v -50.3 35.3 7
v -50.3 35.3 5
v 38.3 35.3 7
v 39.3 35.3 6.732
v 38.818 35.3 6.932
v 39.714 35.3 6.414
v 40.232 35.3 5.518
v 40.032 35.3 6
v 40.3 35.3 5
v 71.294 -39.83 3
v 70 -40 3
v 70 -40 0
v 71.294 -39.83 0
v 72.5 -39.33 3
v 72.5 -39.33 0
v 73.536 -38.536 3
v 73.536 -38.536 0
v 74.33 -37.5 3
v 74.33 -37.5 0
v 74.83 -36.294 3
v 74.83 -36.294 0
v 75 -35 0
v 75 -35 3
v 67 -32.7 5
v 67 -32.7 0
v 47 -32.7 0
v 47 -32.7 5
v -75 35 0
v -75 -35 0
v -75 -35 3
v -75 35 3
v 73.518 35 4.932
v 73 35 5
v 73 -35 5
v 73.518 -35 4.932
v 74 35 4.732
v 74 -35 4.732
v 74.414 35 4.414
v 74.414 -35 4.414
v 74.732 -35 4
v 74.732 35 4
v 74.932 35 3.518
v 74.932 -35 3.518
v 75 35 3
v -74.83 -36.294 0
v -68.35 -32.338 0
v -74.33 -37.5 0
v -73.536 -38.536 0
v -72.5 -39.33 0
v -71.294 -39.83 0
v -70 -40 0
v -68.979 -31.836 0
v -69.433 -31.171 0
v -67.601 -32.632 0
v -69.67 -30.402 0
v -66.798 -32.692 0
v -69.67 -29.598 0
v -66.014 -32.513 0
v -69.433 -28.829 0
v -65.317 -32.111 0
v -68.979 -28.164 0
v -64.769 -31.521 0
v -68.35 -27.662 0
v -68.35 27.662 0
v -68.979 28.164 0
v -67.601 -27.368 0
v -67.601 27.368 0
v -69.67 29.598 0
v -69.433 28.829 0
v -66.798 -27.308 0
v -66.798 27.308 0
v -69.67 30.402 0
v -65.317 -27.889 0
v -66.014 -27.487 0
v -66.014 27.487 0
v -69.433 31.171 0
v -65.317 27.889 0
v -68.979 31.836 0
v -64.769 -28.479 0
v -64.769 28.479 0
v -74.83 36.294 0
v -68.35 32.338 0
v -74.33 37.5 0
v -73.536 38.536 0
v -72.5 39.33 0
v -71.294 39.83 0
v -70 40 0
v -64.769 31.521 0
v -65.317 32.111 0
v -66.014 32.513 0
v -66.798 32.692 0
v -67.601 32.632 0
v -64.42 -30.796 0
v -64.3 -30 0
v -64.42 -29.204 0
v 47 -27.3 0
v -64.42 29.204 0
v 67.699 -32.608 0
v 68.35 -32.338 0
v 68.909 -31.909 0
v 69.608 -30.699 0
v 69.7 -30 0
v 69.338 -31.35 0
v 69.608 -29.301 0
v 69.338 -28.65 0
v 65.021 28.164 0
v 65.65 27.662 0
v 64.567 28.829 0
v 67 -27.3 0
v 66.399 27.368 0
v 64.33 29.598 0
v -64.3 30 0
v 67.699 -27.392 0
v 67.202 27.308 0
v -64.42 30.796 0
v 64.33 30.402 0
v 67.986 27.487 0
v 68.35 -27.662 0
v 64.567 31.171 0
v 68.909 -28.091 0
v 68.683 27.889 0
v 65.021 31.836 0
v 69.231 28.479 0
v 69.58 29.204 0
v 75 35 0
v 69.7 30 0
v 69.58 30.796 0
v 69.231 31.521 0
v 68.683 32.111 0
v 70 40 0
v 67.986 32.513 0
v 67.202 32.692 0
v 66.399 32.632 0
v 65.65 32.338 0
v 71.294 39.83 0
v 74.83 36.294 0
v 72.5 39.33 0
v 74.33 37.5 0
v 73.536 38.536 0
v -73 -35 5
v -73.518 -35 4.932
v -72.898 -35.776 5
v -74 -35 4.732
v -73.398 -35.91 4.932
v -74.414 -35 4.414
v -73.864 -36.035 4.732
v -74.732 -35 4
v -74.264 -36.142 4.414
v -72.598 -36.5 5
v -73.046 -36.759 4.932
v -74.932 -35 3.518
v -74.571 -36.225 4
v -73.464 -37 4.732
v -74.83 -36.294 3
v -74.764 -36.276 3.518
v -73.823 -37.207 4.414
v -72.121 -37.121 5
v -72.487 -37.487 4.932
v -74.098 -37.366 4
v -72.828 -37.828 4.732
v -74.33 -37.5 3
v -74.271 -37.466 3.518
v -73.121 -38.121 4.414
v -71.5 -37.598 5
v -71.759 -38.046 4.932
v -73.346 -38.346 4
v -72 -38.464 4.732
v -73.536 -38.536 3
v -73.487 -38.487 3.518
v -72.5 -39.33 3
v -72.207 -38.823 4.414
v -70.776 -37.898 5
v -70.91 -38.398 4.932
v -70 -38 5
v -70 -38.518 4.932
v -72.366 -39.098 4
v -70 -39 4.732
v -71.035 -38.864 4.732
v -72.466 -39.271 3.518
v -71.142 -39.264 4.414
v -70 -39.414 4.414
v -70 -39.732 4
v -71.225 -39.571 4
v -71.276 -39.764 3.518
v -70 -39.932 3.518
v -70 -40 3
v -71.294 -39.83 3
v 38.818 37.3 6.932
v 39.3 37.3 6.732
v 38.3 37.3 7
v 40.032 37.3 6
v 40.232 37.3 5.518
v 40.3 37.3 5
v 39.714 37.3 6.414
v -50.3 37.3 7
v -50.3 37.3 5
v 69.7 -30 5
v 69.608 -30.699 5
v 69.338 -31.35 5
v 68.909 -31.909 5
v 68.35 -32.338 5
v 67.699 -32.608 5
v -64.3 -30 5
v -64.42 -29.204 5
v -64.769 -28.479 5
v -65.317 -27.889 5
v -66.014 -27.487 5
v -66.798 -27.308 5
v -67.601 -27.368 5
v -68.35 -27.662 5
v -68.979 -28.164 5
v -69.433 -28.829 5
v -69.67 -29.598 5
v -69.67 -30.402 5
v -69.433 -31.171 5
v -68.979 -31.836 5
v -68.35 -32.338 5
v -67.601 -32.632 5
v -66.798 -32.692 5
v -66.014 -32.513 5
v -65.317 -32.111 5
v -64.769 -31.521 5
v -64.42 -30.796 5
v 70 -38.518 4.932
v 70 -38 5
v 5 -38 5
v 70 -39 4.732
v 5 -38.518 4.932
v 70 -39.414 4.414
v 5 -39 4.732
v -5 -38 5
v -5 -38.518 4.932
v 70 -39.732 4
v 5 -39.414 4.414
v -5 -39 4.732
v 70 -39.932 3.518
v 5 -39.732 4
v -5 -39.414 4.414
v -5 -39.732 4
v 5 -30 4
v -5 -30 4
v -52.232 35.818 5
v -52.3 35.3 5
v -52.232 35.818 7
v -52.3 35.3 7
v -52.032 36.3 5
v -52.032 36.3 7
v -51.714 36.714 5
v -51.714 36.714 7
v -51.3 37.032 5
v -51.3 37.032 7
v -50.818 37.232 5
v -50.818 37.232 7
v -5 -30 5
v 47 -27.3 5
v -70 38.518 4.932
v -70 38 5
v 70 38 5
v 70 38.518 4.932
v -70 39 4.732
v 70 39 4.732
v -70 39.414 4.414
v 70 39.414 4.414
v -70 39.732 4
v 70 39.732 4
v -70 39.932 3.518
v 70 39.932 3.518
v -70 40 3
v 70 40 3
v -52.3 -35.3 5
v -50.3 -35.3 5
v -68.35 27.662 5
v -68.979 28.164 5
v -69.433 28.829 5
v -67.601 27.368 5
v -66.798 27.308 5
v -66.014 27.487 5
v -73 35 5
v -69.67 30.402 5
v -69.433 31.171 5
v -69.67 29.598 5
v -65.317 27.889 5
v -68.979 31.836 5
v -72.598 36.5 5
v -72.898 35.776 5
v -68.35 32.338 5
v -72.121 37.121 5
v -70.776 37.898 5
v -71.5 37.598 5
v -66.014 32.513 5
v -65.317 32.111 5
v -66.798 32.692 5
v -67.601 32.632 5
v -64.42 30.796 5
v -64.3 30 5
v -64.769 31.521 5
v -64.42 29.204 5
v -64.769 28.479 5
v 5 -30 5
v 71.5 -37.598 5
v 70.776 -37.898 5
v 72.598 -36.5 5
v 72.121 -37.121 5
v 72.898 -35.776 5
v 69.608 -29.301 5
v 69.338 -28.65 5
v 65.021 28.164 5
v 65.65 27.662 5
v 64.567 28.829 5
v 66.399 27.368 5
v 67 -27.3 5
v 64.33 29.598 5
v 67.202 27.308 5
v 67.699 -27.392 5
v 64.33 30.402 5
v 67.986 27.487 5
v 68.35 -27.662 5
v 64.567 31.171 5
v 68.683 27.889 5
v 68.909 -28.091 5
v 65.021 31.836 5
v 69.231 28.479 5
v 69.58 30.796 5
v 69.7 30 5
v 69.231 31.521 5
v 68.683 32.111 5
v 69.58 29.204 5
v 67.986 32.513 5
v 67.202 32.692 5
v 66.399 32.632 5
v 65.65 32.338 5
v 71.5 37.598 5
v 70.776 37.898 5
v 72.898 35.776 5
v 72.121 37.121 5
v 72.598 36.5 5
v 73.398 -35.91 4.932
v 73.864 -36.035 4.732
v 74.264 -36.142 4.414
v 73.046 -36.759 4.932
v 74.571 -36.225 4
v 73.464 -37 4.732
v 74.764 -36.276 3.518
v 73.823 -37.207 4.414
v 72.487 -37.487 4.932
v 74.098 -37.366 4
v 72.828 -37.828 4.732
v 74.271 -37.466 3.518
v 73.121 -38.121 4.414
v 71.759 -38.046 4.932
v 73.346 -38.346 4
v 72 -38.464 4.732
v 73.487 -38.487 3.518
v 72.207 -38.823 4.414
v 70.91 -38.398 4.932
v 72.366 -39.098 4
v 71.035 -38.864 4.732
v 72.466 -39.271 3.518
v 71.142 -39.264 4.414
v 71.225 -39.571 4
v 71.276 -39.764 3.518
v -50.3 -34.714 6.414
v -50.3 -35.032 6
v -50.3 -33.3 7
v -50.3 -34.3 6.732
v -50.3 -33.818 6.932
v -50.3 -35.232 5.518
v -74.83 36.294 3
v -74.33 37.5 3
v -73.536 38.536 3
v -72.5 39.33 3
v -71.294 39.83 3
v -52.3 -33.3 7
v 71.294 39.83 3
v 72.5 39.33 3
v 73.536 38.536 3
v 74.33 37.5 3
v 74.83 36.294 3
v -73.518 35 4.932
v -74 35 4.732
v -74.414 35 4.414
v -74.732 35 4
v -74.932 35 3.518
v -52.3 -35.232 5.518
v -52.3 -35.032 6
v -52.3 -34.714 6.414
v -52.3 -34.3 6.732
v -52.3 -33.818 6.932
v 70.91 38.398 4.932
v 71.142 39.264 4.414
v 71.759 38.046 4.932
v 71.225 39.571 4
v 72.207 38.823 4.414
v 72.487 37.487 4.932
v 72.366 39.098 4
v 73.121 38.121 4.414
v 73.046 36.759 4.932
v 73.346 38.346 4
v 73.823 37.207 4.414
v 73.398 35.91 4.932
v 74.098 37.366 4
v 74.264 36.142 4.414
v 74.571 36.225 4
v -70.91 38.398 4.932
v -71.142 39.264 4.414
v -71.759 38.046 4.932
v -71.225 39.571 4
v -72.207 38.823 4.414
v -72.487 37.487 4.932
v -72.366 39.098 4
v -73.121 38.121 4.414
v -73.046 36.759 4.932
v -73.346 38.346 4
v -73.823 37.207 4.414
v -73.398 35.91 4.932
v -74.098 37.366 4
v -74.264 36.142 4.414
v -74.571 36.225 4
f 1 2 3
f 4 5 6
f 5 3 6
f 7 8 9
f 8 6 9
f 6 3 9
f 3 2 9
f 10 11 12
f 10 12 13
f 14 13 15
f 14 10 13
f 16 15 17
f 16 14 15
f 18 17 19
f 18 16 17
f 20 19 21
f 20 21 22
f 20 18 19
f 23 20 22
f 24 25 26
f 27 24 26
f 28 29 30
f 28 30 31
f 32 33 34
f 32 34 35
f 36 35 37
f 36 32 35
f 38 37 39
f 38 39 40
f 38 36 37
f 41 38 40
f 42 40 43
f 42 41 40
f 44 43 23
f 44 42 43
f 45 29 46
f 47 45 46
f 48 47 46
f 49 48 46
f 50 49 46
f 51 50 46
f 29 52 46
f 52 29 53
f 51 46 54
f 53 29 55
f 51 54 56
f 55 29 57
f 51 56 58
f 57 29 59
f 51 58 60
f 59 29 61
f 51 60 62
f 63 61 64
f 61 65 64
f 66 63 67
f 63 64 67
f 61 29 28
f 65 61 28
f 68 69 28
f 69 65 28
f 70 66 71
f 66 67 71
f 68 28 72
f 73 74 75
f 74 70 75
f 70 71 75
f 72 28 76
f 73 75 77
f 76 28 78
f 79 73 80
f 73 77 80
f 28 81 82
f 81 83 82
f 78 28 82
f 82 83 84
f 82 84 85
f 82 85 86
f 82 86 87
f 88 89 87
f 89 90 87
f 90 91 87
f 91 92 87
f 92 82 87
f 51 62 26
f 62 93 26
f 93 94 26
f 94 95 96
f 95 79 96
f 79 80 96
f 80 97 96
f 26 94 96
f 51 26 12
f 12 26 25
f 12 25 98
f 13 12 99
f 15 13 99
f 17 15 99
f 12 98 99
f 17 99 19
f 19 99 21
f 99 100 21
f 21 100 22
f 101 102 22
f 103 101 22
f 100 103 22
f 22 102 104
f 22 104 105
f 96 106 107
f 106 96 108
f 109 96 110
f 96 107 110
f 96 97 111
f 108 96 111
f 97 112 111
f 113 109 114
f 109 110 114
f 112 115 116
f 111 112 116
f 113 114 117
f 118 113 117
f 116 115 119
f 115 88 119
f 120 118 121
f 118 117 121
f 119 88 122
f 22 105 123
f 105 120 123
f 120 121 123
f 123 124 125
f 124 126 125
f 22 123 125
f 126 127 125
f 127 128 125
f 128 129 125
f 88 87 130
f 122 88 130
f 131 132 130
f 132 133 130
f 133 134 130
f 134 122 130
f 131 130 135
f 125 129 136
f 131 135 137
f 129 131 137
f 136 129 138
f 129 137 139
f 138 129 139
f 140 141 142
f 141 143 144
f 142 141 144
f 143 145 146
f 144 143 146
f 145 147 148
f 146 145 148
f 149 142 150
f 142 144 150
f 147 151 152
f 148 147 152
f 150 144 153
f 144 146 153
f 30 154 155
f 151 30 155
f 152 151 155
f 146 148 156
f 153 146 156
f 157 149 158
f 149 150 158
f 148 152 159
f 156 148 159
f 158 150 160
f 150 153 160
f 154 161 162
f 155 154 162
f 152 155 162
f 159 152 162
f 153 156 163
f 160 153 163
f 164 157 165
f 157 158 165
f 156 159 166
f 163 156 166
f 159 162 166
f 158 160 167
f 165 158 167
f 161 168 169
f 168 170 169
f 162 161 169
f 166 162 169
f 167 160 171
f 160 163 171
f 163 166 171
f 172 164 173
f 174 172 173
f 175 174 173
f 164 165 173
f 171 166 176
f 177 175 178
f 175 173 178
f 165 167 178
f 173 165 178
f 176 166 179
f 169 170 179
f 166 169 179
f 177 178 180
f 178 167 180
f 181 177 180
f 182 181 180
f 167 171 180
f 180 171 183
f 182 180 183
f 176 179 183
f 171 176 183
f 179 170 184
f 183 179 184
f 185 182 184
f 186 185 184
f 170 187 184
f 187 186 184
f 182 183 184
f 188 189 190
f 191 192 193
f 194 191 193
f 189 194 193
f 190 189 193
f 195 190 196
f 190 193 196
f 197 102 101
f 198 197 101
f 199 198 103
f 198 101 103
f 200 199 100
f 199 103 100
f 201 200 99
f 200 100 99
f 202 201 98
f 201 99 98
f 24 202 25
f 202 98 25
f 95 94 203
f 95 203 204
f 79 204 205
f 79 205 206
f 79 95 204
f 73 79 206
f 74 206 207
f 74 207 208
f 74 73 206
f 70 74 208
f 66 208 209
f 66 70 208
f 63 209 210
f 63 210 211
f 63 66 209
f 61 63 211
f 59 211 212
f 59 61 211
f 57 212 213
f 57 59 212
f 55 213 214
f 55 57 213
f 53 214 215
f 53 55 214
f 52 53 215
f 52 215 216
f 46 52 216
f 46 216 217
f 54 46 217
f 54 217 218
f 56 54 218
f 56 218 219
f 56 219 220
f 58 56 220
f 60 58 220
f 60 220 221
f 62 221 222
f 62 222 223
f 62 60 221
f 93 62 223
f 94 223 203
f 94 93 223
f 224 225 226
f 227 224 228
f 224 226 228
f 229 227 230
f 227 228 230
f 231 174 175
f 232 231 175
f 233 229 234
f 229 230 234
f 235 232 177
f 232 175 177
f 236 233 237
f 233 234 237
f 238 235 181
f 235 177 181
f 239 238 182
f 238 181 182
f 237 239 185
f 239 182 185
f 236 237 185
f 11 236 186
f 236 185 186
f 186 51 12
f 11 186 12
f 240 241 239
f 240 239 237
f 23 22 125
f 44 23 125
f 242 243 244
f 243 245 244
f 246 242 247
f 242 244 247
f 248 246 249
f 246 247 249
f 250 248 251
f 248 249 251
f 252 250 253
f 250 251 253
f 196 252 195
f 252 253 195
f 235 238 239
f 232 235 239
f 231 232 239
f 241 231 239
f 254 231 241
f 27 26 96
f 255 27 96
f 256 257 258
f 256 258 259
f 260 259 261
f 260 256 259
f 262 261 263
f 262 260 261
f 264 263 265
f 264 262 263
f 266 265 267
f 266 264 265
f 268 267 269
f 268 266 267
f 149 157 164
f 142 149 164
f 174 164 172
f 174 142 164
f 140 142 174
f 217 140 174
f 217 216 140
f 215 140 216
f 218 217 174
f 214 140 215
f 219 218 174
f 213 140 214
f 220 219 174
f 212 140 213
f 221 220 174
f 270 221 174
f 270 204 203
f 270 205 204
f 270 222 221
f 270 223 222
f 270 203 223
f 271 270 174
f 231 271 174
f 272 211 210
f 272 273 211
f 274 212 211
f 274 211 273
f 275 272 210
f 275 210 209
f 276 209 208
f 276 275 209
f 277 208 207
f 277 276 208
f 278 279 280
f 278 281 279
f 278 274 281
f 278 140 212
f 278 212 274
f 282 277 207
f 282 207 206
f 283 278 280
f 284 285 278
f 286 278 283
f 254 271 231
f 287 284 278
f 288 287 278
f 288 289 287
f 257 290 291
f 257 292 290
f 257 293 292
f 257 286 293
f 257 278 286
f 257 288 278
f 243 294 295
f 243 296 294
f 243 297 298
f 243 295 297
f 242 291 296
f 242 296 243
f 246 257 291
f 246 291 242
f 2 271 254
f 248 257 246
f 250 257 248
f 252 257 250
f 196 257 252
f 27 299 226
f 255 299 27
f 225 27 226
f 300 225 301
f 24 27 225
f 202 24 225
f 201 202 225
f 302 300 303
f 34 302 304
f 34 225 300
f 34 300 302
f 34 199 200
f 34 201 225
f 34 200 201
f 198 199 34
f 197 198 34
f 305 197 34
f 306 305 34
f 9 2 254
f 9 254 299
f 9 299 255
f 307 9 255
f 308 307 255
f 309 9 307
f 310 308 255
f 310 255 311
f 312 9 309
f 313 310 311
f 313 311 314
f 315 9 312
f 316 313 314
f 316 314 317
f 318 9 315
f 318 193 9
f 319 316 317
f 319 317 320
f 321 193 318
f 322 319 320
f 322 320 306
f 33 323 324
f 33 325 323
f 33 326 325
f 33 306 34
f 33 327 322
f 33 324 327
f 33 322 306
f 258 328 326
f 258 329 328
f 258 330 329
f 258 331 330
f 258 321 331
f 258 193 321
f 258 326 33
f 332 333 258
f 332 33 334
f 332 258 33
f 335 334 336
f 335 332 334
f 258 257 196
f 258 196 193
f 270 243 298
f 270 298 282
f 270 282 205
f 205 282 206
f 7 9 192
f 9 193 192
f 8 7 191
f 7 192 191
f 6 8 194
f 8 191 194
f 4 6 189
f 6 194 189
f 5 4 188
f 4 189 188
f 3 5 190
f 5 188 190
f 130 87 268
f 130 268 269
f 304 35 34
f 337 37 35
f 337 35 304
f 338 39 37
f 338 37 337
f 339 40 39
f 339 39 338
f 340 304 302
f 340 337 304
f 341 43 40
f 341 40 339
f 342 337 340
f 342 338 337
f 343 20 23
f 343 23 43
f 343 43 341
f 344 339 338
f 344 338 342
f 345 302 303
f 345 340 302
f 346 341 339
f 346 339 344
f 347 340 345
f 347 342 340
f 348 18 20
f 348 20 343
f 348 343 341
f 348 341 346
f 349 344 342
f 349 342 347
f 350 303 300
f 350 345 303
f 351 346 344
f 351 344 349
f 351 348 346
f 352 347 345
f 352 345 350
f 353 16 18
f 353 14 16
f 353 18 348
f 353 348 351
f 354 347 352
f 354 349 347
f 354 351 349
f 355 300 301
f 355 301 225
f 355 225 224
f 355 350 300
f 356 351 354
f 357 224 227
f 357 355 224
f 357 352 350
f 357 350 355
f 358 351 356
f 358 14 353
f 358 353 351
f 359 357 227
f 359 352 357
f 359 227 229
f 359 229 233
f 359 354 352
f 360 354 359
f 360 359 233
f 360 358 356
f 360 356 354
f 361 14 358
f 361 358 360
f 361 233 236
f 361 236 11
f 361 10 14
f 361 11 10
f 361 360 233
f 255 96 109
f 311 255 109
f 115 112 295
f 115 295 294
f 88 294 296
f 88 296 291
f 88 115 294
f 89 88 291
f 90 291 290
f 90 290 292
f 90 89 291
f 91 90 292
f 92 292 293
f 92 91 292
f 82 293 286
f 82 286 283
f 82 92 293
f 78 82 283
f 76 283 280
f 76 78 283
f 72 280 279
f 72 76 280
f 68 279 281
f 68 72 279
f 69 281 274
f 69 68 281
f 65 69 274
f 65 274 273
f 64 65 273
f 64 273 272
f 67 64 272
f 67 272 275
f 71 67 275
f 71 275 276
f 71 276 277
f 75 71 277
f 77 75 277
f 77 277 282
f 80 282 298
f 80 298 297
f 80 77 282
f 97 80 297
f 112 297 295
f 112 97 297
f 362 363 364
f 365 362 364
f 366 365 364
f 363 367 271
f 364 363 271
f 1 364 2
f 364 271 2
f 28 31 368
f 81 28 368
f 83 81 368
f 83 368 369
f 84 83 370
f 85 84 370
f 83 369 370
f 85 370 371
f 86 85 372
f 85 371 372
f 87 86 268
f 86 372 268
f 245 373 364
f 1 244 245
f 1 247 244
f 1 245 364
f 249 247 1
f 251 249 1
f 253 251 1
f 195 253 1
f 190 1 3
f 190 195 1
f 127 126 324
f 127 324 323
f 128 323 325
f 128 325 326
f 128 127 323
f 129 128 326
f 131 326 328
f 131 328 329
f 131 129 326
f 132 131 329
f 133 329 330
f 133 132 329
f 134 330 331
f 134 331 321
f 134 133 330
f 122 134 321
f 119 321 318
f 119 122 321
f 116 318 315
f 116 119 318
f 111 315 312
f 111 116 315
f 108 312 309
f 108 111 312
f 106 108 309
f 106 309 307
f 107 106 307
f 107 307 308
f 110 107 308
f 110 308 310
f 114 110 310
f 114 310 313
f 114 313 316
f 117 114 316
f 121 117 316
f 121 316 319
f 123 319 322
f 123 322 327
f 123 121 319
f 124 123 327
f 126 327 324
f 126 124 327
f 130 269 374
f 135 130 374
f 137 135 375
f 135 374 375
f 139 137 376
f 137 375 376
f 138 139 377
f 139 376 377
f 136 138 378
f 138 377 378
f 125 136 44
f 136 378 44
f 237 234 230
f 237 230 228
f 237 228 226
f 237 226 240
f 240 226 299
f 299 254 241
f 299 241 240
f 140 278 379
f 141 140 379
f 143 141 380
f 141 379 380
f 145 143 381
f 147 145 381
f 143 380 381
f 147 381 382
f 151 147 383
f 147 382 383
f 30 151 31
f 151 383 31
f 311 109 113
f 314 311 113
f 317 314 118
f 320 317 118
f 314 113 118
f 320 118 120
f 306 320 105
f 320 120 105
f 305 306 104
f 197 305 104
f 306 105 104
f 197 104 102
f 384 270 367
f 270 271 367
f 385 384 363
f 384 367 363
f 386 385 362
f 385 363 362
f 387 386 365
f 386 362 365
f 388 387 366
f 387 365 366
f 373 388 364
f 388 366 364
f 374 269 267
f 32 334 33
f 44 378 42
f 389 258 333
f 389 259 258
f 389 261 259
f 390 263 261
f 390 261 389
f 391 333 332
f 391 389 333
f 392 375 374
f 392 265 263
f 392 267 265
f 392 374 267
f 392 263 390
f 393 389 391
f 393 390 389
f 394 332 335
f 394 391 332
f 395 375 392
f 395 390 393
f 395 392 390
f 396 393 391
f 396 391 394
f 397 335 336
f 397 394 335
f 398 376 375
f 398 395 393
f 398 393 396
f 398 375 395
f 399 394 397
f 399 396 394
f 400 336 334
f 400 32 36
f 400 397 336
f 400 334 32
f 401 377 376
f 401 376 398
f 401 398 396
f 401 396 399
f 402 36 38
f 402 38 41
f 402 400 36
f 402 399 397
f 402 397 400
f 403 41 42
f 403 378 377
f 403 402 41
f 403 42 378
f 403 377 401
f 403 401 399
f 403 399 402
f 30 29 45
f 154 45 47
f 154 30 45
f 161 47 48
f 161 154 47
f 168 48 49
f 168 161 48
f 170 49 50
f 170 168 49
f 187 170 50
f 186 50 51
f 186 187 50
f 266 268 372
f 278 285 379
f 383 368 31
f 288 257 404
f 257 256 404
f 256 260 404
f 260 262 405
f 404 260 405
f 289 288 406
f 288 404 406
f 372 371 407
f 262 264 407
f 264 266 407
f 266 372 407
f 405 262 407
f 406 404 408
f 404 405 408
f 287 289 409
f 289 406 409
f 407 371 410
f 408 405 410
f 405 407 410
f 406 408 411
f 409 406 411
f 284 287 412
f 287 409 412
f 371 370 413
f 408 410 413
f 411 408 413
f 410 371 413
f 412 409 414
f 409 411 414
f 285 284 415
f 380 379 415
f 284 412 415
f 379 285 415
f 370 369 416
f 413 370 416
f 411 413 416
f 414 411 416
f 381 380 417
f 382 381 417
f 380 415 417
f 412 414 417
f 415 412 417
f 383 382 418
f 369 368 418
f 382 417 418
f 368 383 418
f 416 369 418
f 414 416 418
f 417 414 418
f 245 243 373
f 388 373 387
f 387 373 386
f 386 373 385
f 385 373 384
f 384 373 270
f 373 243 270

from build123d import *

# Parameters (mm, degrees)
F0_W         = 150
F0_H         = 80
F0_R         = 2.7
F1_DEPTH     = 5
F3_DEPTH     = 2
F4_R         = 5
F5_R         = 1.99999
F6_R         = 2
F7_W         = 10
F7_H         = 10
F8_DEPTH     = 1
F9_T1_DEPTH  = 70
F9_T3_DEPTH  = 140
F9_T5_DEPTH  = 70
F9_T7_DEPTH  = 70
F9_T10_ANGLE = 90
F9_T12_ANGLE = 90
F9_T14_ANGLE = 90
F9_T16_ANGLE = 90


# Not quite as in the source:
# - a fillet or chamfer that OpenCascade refuses, or shapes differently, is made with other operations: its cross-section is extruded or revolved along the edge and cut away or added
# - a fillet or chamfer is up to 0.001 mm smaller than in the source, because OpenCascade refuses the exact size
# - a feature names something its author has since deleted; it is built from what else it names


with BuildPart() as f1:
    # F0 (on Top) → F1 (new body)
    with BuildSketch(Plane.XY):
        Rectangle(F0_W, F0_H)
        with Locations((-67, -30)):
            Circle(F0_R, mode=Mode.SUBTRACT)
        with BuildLine():
            ThreePointArc((67, -27.3), (68.9091883092, -28.0908116908), (69.7, -30))
            ThreePointArc((69.7, -30), (68.9091883092, -31.9091883092), (67, -32.7))
            Line((67, -32.7), (47, -32.7))
            Line((47, -32.7), (47, -27.3))
            Line((47, -27.3), (67, -27.3))
        make_face(mode=Mode.SUBTRACT)
        with Locations((-67, 30)):
            Circle(F0_R, mode=Mode.SUBTRACT)
        with Locations((67, 30)):
            Circle(F0_R, mode=Mode.SUBTRACT)
    extrude(amount=F1_DEPTH)

    # F2 (on face) → F3 (join)
    with BuildSketch(Plane.XY.offset(5)):
        Polygon((-50.3, -35.3), (-50.3, 35.3), (40.3, 35.3), (40.3, 37.3), (-52.3, 37.3), (-52.3, -35.3), align=None)
    extrude(amount=F3_DEPTH)

    # F4
    f4_edges = [f1.edges().sort_by_distance(p)[0] for p in [
        (75, -40, 2.5),
        (-75, -40, 2.5),
        (-75, 40, 2.5),
        (75, 40, 2.5),
    ]]
    fillet(f4_edges, radius=F4_R)

    # F5 (radius 2 in the source; OpenCascade refuses exactly that, so slightly less here)
    f5_edges = [f1.edges().sort_by_distance(p)[0] for p in [
        (-51.3, -35.3, 7),
        (40.3, 36.3, 7),
    ]]
    fillet(f5_edges, radius=F5_R)

    # F6
    f6_edges = [f1.edges().sort_by_distance(p)[0] for p in [
        (-52.3, 37.3, 6),
    ]]
    fillet(f6_edges, radius=F6_R)

    # F7 (on face) → F8 (cut)
    with BuildSketch(Plane.XY.offset(5)):
        with Locations((0, -35)):
            Rectangle(F7_W, F7_H)
    extrude(amount=-F8_DEPTH, mode=Mode.SUBTRACT)

    # F9: fillet of radius 2 on 7 edges, made by hand

    # F9_s2 → F9_t1 (cut)
    with BuildSketch(Plane.XZ.offset(-35)):
        with BuildLine():
            ThreePointArc((-73, 5), (-74.4142135624, 4.4142135624), (-75, 3))
            Line((-75, 3), (-75, 5))
            Line((-75, 5), (-73, 5))
        make_face()
        with BuildLine():
            ThreePointArc((73, 5), (74.4142135624, 4.4142135624), (75, 3))
            Line((75, 3), (75, 5))
            Line((75, 5), (73, 5))
        make_face()
    extrude(amount=F9_T1_DEPTH, mode=Mode.SUBTRACT)

    # F9_s4 → F9_t3 (cut)
    with BuildSketch(Plane.YZ.offset(-70)):
        with BuildLine():
            ThreePointArc((38, 5), (39.4142135624, 4.4142135624), (40, 3))
            Line((40, 3), (40, 5))
            Line((40, 5), (38, 5))
        make_face()
    extrude(amount=F9_T3_DEPTH, mode=Mode.SUBTRACT)

    # F9_s6 → F9_t5 (cut)
    with BuildSketch(Plane.YZ):
        with BuildLine():
            ThreePointArc((-38, 5), (-39.4142135624, 4.4142135624), (-40, 3))
            Line((-40, 3), (-40, 5))
            Line((-40, 5), (-38, 5))
        make_face()
    extrude(amount=F9_T5_DEPTH, mode=Mode.SUBTRACT)

    # F9_s8 → F9_t7 (cut)
    with BuildSketch(Plane.YZ.offset(-70)):
        with BuildLine():
            ThreePointArc((-38, 5), (-39.4142135624, 4.4142135624), (-40, 3))
            Line((-40, 3), (-40, 5))
            Line((-40, 5), (-38, 5))
        make_face()
    extrude(amount=F9_T7_DEPTH, mode=Mode.SUBTRACT)

    # F9_s9 → F9_t10 (revolve, cut)
    with BuildSketch(Plane.XZ.offset(35)):
        with BuildLine():
            ThreePointArc((-73, 5), (-74.4142135624, 4.4142135624), (-75, 3))
            Line((-75, 3), (-75, 5))
            Line((-75, 5), (-73, 5))
        make_face()
    revolve(axis=Axis((-70, -35, 5), (0, 0, 1)), revolution_arc=F9_T10_ANGLE, mode=Mode.SUBTRACT)

    # F9_s11 → F9_t12 (revolve, cut)
    with BuildSketch(Plane.XZ.offset(35)):
        with BuildLine():
            ThreePointArc((73, 5), (74.4142135624, 4.4142135624), (75, 3))
            Line((75, 3), (75, 5))
            Line((75, 5), (73, 5))
        make_face()
    revolve(axis=Axis((70, -35, 5), (0, 0, -1)), revolution_arc=F9_T12_ANGLE, mode=Mode.SUBTRACT)

    # F9_s13 → F9_t14 (revolve, cut)
    with BuildSketch(Plane.YZ.offset(70)):
        with BuildLine():
            ThreePointArc((38, 5), (39.4142135624, 4.4142135624), (40, 3))
            Line((40, 3), (40, 5))
            Line((40, 5), (38, 5))
        make_face()
    revolve(axis=Axis((70, 35, 5), (0, 0, -1)), revolution_arc=F9_T14_ANGLE, mode=Mode.SUBTRACT)

    # F9_s15 → F9_t16 (revolve, cut)
    with BuildSketch(Plane.YZ.offset(-70)):
        with BuildLine():
            ThreePointArc((38, 5), (39.4142135624, 4.4142135624), (40, 3))
            Line((40, 3), (40, 5))
            Line((40, 5), (38, 5))
        make_face()
    revolve(axis=Axis((-70, 35, 5), (0, 0, 1)), revolution_arc=F9_T16_ANGLE, mode=Mode.SUBTRACT)


solid = f1.part
